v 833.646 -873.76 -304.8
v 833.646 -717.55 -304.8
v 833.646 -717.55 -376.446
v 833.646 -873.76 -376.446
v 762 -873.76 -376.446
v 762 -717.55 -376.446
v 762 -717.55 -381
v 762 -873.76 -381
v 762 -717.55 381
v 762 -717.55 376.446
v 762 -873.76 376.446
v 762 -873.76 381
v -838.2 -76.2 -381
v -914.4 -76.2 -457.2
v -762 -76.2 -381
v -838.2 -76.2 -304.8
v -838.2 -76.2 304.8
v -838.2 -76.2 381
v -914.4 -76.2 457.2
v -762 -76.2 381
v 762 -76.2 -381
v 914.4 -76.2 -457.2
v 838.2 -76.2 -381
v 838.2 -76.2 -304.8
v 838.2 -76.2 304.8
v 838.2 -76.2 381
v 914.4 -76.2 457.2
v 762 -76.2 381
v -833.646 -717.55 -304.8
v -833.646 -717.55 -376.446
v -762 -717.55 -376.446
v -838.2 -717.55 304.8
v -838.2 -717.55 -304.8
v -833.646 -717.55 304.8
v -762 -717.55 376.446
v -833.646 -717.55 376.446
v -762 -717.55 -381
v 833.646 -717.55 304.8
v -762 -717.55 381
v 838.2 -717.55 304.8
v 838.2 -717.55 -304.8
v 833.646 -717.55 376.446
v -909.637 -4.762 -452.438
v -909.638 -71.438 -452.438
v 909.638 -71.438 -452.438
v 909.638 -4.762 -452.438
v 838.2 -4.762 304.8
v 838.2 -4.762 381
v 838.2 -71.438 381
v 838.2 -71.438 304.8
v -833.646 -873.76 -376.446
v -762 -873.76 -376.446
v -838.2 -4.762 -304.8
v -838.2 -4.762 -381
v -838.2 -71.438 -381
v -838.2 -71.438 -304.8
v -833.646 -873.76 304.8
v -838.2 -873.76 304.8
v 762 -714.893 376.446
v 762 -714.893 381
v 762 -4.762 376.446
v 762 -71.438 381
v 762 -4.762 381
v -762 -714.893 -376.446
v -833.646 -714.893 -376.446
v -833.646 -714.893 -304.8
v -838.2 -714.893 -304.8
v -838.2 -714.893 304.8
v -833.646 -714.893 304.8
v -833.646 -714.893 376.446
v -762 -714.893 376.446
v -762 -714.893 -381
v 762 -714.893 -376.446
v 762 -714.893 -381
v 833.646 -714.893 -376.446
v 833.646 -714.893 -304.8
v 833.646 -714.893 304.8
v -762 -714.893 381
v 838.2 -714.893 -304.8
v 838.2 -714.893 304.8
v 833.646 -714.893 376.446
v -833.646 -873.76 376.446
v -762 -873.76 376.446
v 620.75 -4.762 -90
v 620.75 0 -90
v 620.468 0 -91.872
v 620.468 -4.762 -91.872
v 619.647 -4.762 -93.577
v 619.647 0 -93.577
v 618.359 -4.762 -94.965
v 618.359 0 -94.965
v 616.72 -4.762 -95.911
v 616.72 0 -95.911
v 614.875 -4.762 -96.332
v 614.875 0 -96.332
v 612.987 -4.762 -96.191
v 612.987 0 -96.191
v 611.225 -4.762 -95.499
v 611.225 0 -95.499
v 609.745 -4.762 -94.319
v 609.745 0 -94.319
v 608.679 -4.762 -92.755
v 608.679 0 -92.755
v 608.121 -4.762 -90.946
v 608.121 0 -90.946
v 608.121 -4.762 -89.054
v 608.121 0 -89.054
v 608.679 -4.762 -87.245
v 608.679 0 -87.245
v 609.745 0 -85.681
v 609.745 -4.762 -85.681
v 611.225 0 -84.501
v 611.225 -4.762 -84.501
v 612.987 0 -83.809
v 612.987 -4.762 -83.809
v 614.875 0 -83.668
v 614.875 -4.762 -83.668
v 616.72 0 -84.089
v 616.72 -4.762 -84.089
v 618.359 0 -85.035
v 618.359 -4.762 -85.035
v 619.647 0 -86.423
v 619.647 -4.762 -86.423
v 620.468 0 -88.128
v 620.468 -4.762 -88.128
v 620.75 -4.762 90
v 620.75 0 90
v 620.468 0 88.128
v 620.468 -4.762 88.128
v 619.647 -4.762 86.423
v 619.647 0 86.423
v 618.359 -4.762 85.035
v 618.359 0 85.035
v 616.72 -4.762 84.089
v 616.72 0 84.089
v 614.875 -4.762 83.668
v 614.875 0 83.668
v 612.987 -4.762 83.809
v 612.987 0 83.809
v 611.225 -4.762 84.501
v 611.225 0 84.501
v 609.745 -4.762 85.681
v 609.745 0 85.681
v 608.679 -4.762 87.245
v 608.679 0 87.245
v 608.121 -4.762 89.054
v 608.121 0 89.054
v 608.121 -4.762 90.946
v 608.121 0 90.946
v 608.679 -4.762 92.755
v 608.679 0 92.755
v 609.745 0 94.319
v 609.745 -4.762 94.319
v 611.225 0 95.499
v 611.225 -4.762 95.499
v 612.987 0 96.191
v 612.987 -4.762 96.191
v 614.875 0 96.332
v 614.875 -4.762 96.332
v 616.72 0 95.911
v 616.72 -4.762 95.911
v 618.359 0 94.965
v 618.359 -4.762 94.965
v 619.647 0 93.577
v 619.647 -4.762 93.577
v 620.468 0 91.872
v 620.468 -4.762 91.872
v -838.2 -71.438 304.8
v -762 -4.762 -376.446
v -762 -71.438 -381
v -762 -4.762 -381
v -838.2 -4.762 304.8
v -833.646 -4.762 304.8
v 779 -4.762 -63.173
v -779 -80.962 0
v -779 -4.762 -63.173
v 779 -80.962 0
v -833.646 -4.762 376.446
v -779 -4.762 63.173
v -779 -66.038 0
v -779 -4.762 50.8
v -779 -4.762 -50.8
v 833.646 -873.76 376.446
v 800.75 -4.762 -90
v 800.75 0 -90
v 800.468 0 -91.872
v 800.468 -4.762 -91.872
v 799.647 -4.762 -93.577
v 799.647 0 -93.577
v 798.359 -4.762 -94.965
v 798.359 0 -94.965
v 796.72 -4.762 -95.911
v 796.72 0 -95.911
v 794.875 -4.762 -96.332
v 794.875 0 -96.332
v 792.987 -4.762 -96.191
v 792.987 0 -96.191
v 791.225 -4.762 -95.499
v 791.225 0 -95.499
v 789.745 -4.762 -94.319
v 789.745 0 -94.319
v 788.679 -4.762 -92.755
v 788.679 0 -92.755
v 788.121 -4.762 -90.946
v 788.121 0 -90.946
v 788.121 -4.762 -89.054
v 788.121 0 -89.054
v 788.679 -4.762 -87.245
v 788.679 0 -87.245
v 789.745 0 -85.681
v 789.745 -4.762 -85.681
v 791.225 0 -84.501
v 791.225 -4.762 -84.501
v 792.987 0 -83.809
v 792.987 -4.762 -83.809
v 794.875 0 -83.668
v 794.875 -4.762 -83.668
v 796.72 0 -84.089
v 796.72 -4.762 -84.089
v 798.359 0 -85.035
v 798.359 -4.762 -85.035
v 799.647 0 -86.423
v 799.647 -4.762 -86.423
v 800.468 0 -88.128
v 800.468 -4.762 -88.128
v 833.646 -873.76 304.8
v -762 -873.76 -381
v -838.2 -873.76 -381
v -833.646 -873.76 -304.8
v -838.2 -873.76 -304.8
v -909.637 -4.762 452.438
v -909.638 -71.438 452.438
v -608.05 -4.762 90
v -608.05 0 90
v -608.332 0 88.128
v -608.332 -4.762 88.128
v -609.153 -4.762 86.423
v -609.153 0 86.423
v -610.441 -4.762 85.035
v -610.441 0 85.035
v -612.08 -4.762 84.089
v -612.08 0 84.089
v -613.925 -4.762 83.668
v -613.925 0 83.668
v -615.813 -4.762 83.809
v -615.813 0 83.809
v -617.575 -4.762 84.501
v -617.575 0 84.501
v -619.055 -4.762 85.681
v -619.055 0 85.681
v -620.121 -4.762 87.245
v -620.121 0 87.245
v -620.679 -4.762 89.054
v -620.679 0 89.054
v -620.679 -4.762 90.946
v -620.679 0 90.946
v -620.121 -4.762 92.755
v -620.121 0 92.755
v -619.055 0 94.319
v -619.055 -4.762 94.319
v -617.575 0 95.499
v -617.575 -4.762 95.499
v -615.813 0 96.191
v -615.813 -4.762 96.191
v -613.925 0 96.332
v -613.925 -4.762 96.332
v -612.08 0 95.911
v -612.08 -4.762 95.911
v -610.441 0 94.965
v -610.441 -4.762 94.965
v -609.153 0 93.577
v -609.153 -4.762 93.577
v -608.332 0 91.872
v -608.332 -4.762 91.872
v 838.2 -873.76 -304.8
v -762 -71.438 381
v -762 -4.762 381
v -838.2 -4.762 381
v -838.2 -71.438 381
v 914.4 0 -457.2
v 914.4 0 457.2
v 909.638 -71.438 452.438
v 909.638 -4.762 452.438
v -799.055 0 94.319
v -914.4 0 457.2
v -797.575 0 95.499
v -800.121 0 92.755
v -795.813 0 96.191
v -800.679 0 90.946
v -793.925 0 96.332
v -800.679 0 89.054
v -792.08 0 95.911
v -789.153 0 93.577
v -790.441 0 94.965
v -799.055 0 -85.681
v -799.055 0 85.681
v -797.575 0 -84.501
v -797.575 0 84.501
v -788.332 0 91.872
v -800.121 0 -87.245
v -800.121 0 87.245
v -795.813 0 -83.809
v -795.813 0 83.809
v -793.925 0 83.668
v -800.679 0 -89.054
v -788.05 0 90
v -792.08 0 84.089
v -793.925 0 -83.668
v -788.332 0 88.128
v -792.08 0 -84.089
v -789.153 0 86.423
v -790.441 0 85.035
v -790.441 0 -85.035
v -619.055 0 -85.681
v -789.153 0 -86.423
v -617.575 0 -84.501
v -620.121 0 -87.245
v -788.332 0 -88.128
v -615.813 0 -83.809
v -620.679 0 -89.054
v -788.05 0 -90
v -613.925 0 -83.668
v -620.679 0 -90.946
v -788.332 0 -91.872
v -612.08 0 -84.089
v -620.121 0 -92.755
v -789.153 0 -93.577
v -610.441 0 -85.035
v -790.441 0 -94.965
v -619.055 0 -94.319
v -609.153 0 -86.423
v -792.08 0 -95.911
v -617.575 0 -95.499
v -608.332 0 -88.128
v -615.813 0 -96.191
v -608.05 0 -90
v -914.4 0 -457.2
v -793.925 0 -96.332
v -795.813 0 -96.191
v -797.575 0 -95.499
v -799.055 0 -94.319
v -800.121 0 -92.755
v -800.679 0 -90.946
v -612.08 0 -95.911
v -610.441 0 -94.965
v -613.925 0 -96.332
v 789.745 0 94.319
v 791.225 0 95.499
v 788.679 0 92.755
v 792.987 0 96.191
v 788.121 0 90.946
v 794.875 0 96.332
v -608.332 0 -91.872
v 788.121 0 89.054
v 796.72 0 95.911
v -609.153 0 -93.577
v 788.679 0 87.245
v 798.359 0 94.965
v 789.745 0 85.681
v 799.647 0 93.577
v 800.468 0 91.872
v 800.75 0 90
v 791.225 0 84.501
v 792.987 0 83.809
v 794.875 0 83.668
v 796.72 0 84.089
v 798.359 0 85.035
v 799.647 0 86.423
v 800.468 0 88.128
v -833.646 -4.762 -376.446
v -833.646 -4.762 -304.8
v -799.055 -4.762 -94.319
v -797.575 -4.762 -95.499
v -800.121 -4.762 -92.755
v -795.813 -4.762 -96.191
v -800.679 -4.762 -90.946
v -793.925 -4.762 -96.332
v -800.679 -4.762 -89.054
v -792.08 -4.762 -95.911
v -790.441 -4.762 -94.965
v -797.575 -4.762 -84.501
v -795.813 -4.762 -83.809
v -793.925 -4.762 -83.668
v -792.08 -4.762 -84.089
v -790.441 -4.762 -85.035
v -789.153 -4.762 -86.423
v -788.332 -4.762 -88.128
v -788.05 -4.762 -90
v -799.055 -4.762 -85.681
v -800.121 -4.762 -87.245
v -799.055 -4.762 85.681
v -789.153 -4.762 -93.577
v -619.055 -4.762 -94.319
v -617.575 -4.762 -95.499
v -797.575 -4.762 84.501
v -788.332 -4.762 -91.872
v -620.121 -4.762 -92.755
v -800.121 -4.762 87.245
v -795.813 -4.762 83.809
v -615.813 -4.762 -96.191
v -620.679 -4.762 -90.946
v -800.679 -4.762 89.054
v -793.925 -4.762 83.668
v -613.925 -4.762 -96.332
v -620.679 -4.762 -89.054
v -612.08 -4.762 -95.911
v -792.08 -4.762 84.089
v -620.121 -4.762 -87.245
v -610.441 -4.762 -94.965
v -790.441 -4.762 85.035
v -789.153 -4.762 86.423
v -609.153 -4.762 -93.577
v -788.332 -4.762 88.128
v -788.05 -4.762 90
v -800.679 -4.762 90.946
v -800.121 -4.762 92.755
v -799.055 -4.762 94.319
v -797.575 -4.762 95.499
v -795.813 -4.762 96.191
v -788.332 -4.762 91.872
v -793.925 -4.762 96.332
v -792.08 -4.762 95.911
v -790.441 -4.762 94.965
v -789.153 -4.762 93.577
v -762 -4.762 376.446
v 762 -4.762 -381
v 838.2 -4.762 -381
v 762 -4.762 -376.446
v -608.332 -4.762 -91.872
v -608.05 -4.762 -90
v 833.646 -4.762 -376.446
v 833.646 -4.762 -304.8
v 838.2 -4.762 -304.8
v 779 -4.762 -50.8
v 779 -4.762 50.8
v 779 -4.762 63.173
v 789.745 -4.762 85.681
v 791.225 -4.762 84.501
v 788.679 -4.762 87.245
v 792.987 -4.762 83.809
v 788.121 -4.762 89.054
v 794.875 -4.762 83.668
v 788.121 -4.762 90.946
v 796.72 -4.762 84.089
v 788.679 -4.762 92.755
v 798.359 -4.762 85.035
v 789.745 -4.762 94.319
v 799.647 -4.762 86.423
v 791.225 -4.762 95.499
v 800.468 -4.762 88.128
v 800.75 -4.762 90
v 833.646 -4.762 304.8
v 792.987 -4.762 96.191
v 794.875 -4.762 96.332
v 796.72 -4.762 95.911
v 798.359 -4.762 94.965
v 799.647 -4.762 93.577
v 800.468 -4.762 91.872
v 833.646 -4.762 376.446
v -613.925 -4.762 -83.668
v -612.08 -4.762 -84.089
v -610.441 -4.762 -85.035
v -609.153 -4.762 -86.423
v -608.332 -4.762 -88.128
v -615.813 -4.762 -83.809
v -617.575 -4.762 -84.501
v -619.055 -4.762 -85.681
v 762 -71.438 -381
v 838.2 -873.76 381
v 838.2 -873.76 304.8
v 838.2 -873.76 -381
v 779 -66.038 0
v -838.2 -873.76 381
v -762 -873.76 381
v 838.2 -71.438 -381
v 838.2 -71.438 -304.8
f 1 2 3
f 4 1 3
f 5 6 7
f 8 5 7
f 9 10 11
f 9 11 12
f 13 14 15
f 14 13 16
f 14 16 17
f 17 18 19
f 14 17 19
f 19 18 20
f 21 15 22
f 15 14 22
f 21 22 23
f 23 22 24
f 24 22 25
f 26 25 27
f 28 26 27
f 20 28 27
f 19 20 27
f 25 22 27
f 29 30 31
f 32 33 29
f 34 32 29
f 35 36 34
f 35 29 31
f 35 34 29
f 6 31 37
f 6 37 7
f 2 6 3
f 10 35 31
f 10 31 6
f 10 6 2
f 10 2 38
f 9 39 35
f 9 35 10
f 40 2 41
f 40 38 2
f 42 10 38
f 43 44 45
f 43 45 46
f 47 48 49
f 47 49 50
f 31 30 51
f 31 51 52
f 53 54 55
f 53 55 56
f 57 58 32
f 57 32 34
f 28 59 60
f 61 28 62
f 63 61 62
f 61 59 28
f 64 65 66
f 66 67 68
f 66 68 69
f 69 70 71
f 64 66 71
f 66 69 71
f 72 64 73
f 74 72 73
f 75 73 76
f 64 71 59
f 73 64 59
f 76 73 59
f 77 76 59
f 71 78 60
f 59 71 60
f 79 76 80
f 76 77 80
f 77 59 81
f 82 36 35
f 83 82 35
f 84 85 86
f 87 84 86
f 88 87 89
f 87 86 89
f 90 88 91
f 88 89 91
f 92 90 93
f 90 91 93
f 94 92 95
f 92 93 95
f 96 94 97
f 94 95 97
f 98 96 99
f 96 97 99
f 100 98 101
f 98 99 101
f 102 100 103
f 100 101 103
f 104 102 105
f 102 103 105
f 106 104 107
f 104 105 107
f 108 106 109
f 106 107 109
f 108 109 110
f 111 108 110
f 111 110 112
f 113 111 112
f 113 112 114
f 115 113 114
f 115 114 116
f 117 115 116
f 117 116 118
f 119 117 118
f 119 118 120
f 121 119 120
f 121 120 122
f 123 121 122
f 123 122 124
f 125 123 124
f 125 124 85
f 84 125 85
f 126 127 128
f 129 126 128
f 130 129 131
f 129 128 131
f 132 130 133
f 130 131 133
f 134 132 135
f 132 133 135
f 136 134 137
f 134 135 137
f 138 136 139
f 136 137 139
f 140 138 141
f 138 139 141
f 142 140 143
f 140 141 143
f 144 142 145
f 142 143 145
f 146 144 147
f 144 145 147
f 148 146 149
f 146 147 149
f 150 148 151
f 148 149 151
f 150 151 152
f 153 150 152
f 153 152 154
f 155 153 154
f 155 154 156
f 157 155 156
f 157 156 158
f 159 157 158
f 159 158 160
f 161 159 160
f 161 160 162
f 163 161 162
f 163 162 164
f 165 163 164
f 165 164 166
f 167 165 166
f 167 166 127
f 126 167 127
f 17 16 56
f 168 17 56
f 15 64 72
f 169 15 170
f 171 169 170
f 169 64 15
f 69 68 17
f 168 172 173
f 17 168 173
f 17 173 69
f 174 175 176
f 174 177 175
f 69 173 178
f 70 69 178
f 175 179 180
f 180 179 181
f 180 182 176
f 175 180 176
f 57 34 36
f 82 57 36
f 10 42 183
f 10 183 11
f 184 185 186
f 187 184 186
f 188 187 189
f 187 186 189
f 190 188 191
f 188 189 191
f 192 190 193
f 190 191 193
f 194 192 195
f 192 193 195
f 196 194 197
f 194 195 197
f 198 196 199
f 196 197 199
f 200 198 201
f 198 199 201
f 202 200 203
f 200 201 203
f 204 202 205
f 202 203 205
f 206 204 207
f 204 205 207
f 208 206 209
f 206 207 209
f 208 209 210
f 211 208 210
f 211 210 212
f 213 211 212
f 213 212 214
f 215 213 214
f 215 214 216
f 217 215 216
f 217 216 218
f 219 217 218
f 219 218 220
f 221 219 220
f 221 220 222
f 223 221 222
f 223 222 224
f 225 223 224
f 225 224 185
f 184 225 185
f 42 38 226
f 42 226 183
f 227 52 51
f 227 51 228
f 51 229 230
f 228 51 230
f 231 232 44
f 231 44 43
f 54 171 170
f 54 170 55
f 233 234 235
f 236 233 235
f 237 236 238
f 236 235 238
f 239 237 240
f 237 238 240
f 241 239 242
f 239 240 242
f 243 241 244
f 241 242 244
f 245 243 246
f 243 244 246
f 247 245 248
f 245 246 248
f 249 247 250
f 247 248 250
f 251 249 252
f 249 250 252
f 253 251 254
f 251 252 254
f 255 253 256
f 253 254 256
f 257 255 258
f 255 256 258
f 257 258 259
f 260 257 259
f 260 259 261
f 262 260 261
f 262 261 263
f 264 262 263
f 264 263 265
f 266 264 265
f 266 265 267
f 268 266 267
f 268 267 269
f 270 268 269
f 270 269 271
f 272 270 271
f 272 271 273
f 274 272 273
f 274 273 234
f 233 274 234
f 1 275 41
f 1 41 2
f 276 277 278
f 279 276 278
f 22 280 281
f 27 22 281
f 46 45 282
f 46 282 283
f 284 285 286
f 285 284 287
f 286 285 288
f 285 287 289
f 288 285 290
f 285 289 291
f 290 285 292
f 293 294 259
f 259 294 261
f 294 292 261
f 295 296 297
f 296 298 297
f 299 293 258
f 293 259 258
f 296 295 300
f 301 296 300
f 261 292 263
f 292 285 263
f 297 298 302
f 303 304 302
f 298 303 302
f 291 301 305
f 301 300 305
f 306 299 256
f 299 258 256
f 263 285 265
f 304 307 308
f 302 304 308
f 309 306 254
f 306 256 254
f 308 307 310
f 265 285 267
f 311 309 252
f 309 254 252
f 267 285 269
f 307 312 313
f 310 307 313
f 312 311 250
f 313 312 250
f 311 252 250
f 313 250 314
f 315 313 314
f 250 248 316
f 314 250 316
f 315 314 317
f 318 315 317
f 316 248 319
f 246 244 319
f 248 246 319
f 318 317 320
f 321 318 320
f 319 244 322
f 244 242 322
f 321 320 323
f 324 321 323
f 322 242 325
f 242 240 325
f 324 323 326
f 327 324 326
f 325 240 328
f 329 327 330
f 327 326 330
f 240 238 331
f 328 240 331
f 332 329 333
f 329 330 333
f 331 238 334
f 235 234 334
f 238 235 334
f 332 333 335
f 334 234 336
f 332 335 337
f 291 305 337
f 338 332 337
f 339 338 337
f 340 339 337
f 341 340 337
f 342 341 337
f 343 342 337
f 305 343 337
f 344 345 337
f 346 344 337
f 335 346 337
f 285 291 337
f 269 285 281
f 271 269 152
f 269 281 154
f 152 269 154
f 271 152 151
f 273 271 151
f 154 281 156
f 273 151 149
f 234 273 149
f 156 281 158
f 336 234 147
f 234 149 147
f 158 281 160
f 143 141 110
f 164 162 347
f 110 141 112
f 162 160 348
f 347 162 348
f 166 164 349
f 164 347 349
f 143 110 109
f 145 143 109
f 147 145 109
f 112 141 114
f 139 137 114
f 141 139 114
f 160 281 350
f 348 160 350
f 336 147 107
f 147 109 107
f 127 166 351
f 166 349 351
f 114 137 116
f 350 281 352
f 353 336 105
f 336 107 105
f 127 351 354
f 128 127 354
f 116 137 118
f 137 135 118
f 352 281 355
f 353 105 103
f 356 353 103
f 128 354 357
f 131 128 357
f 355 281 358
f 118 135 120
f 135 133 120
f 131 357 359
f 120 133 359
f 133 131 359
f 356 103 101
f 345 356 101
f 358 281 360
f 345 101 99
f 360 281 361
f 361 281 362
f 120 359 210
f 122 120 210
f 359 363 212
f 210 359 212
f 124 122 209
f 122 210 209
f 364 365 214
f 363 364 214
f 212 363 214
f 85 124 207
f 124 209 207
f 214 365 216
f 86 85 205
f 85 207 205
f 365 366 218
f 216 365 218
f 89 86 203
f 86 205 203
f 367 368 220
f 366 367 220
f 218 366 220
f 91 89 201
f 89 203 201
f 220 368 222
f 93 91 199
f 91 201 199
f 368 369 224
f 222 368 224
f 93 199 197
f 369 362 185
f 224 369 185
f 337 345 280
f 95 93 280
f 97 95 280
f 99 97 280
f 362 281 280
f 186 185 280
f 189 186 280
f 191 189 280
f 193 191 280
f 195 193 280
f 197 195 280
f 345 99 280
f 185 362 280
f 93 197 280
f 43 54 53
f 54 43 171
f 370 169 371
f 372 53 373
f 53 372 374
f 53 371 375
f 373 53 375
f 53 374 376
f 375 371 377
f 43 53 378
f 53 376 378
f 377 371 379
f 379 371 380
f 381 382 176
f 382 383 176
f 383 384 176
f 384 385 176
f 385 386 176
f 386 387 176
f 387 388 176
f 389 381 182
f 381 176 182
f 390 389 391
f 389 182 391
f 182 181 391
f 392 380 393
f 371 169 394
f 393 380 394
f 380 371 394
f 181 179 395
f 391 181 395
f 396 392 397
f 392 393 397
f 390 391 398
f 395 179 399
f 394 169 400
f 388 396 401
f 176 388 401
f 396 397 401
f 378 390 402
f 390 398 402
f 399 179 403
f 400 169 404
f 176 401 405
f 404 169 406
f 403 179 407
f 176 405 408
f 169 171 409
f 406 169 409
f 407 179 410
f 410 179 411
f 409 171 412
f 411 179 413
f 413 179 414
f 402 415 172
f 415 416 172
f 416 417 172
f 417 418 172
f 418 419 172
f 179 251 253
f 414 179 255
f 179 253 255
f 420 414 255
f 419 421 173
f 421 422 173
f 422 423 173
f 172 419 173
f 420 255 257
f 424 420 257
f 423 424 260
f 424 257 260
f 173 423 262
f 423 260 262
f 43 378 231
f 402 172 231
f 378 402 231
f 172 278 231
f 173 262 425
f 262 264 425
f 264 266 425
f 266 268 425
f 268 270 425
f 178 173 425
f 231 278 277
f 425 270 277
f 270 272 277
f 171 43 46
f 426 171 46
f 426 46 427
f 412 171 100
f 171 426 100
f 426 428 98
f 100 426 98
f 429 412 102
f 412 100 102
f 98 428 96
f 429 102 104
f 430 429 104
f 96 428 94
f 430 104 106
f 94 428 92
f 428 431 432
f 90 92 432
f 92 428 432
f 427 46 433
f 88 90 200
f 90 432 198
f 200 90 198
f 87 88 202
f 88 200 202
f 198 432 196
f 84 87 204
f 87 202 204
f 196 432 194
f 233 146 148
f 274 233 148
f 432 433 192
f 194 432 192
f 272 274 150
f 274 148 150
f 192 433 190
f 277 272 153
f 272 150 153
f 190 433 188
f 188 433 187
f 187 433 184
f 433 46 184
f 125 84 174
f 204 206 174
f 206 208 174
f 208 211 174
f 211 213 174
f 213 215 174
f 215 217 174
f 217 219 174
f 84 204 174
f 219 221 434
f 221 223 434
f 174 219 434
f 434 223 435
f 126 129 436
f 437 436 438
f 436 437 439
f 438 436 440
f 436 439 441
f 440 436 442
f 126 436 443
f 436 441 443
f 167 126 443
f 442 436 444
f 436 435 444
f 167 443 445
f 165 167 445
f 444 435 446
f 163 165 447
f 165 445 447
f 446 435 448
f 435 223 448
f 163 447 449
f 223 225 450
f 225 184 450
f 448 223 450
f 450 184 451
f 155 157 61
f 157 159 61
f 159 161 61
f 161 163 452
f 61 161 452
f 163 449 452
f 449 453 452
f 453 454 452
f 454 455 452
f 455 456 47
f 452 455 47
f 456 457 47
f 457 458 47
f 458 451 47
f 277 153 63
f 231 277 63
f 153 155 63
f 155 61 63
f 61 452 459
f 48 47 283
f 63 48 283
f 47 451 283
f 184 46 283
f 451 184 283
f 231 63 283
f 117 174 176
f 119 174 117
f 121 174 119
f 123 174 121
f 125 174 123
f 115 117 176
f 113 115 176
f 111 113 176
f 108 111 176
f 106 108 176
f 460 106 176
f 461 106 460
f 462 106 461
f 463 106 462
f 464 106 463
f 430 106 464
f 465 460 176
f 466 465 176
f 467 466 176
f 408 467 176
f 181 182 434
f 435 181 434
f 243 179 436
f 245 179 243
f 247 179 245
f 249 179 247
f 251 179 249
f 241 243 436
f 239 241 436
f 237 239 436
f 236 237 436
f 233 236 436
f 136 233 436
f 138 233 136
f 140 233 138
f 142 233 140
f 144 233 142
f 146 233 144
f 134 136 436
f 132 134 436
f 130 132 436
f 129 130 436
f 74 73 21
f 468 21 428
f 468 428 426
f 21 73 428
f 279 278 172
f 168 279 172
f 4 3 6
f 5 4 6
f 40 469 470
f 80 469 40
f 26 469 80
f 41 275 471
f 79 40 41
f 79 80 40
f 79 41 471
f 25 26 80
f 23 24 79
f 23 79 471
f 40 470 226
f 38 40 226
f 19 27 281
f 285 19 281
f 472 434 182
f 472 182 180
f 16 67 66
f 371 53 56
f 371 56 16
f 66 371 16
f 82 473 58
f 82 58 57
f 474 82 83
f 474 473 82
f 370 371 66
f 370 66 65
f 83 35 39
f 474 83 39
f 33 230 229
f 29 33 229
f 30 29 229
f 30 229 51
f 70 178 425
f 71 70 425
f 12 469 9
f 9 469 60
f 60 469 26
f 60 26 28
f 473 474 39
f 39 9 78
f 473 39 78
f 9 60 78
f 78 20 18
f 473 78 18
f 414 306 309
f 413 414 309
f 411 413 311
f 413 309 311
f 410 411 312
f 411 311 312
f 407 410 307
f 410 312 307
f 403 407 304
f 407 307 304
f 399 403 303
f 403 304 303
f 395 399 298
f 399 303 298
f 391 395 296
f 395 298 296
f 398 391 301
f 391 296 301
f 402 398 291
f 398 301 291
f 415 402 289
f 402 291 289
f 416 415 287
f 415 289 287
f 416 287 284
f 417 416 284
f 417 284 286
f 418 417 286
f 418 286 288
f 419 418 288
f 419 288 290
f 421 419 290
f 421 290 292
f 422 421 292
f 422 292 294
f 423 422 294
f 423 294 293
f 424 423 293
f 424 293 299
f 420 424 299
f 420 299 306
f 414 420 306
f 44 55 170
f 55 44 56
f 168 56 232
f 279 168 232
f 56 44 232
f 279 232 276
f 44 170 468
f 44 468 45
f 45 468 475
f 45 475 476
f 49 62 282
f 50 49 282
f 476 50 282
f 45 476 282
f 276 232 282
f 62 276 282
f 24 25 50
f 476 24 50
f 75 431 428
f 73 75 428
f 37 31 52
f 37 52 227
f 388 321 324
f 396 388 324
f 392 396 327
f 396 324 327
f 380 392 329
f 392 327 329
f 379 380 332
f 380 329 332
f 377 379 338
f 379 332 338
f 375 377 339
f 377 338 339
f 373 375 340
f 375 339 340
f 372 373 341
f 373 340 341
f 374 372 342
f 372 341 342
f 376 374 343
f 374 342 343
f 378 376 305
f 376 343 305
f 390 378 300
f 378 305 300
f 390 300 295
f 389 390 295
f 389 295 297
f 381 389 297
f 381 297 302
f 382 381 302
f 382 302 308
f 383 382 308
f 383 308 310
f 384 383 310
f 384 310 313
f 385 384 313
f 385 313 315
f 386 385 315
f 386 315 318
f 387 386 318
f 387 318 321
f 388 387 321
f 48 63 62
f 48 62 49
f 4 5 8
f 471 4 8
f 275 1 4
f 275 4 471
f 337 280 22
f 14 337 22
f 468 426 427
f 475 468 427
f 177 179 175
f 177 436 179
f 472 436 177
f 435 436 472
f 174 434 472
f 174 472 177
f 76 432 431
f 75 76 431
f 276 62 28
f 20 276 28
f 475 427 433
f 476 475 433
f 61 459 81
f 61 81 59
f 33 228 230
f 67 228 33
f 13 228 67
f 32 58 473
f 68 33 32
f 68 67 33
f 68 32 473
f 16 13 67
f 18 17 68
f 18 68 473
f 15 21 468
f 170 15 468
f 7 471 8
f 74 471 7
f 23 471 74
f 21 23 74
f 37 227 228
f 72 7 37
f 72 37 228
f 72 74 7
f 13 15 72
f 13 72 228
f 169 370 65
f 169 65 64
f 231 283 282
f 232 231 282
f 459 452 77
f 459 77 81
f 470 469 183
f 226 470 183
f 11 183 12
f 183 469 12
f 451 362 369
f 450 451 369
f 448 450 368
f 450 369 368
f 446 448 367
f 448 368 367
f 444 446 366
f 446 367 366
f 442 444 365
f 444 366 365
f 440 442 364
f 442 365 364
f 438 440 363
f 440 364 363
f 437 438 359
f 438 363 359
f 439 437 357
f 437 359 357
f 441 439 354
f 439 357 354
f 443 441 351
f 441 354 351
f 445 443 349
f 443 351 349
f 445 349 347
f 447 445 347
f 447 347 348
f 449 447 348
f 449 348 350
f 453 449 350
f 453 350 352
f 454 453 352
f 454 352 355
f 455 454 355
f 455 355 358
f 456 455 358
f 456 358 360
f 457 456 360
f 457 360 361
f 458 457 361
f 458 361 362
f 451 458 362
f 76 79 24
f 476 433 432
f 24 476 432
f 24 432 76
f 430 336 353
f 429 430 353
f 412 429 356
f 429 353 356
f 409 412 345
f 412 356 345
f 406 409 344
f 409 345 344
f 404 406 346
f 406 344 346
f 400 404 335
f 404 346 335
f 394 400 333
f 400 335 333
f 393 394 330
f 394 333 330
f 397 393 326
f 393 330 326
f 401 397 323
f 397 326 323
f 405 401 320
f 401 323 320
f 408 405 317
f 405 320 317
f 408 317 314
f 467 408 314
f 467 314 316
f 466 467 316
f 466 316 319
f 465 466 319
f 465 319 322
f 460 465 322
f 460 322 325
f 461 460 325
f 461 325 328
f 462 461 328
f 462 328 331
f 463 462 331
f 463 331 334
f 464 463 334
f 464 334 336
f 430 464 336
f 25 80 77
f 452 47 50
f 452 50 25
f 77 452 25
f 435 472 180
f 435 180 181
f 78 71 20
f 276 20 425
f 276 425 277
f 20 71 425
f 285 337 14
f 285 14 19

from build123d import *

# Parameters (mm, degrees)
BOSS_EXTRUDE1_DEPTH = 914.4
BOSS_EXTRUDE2_DEPTH = 457.2
BOSS_EXTRUDE3_DEPTH = 868.9975
BOSS_EXTRUDE4_START = 712.7875
SKETCH5_W           = 1676.4
SKETCH5_H           = 762
BOSS_EXTRUDE4_DEPTH = 2.657
SKETCH6_R           = 6.35
CUT_EXTRUDE1_DEPTH  = 10
BOSS_EXTRUDE5_DEPTH = 779


with BuildPart() as part:
    # Sketch1 → Boss-Extrude1 (new body, symmetric)
    with BuildSketch(Plane(origin=(0, 0, 0), x_dir=(0, 0, -1), z_dir=(1, 0, 0))):
        Polygon((-457.2, 0), (457.2, 0), (457.2, -76.2), (381, -76.2), (381, -71.4375), (452.4375, -71.4375), (452.4375, -4.7625), (-452.4375, -4.7625), (-452.4375, -71.4375), (-381, -71.4375), (-381, -76.2), (-457.2, -76.2), align=None)
    extrude(amount=BOSS_EXTRUDE1_DEPTH, both=True)

    # Sketch2 → Boss-Extrude2 (add, symmetric)
    with BuildSketch(Plane.XY):
        Polygon((-914.4, 0), (-914.4, -76.2), (-838.2, -76.2), (-838.2, -71.4375), (-909.6375, -71.4375), (-909.6375, 0), align=None)
        Polygon((909.6375, 0), (914.4, 0), (914.4, -76.2), (838.2, -76.2), (838.2, -71.4375), (909.6375, -71.4375), align=None)
    extrude(amount=BOSS_EXTRUDE2_DEPTH, both=True)

    # Sketch4 → Boss-Extrude3 (add)
    with BuildSketch(Plane.XZ.offset(4.7625)):
        Polygon((-762, 381), (-838.2, 381), (-838.2, 304.8), (-833.646, 304.8), (-833.646, 376.446), (-762, 376.446), align=None)
        Polygon((-833.646, -376.446), (-762, -376.446), (-762, -381), (-838.2, -381), (-838.2, -304.8), (-833.646, -304.8), align=None)
        Polygon((833.646, -304.8), (833.646, -376.446), (762, -376.446), (762, -381), (838.2, -381), (838.2, -304.8), align=None)
        Polygon((833.646, 376.446), (762, 376.446), (762, 381), (838.2, 381), (838.2, 304.8), (833.646, 304.8), align=None)
    extrude(amount=BOSS_EXTRUDE3_DEPTH)

    # Sketch5 → Boss-Extrude4 (add)
    with BuildSketch(Plane.XZ.offset(4.7625).offset(BOSS_EXTRUDE4_START)):
        Rectangle(SKETCH5_W, SKETCH5_H)
    extrude(amount=-BOSS_EXTRUDE4_DEPTH)

    # Sketch6 → Cut-Extrude1 (cut)
    with BuildSketch(Plane(origin=(0, 0, 0), x_dir=(1, 0, 0), z_dir=(0, 1, 0))):
        with Locations((-794.4, 90)):
            Circle(SKETCH6_R)
        with Locations((-614.4, 90)):
            Circle(SKETCH6_R)
        with Locations((-794.4, -90)):
            Circle(SKETCH6_R)
        with Locations((-614.4, -90)):
            Circle(SKETCH6_R)
        with Locations((614.4, -90)):
            Circle(SKETCH6_R)
        with Locations((794.4, -90)):
            Circle(SKETCH6_R)
        with Locations((794.4, 90)):
            Circle(SKETCH6_R)
        with Locations((614.4, 90)):
            Circle(SKETCH6_R)
    extrude(amount=-CUT_EXTRUDE1_DEPTH, mode=Mode.SUBTRACT)

    # Sketch7 → Boss-Extrude5 (add, symmetric)
    with BuildSketch(Plane(origin=(0, 0, 0), x_dir=(0, 0, -1), z_dir=(1, 0, 0))):
        Polygon((63.172612778, -4.7625), (50.8, -4.7625), (0, -66.038420526), (-50.8, -4.7625), (-63.172612778, -4.7625), (0, -80.9625), align=None)
    extrude(amount=BOSS_EXTRUDE5_DEPTH, both=True)


solid = part.part
